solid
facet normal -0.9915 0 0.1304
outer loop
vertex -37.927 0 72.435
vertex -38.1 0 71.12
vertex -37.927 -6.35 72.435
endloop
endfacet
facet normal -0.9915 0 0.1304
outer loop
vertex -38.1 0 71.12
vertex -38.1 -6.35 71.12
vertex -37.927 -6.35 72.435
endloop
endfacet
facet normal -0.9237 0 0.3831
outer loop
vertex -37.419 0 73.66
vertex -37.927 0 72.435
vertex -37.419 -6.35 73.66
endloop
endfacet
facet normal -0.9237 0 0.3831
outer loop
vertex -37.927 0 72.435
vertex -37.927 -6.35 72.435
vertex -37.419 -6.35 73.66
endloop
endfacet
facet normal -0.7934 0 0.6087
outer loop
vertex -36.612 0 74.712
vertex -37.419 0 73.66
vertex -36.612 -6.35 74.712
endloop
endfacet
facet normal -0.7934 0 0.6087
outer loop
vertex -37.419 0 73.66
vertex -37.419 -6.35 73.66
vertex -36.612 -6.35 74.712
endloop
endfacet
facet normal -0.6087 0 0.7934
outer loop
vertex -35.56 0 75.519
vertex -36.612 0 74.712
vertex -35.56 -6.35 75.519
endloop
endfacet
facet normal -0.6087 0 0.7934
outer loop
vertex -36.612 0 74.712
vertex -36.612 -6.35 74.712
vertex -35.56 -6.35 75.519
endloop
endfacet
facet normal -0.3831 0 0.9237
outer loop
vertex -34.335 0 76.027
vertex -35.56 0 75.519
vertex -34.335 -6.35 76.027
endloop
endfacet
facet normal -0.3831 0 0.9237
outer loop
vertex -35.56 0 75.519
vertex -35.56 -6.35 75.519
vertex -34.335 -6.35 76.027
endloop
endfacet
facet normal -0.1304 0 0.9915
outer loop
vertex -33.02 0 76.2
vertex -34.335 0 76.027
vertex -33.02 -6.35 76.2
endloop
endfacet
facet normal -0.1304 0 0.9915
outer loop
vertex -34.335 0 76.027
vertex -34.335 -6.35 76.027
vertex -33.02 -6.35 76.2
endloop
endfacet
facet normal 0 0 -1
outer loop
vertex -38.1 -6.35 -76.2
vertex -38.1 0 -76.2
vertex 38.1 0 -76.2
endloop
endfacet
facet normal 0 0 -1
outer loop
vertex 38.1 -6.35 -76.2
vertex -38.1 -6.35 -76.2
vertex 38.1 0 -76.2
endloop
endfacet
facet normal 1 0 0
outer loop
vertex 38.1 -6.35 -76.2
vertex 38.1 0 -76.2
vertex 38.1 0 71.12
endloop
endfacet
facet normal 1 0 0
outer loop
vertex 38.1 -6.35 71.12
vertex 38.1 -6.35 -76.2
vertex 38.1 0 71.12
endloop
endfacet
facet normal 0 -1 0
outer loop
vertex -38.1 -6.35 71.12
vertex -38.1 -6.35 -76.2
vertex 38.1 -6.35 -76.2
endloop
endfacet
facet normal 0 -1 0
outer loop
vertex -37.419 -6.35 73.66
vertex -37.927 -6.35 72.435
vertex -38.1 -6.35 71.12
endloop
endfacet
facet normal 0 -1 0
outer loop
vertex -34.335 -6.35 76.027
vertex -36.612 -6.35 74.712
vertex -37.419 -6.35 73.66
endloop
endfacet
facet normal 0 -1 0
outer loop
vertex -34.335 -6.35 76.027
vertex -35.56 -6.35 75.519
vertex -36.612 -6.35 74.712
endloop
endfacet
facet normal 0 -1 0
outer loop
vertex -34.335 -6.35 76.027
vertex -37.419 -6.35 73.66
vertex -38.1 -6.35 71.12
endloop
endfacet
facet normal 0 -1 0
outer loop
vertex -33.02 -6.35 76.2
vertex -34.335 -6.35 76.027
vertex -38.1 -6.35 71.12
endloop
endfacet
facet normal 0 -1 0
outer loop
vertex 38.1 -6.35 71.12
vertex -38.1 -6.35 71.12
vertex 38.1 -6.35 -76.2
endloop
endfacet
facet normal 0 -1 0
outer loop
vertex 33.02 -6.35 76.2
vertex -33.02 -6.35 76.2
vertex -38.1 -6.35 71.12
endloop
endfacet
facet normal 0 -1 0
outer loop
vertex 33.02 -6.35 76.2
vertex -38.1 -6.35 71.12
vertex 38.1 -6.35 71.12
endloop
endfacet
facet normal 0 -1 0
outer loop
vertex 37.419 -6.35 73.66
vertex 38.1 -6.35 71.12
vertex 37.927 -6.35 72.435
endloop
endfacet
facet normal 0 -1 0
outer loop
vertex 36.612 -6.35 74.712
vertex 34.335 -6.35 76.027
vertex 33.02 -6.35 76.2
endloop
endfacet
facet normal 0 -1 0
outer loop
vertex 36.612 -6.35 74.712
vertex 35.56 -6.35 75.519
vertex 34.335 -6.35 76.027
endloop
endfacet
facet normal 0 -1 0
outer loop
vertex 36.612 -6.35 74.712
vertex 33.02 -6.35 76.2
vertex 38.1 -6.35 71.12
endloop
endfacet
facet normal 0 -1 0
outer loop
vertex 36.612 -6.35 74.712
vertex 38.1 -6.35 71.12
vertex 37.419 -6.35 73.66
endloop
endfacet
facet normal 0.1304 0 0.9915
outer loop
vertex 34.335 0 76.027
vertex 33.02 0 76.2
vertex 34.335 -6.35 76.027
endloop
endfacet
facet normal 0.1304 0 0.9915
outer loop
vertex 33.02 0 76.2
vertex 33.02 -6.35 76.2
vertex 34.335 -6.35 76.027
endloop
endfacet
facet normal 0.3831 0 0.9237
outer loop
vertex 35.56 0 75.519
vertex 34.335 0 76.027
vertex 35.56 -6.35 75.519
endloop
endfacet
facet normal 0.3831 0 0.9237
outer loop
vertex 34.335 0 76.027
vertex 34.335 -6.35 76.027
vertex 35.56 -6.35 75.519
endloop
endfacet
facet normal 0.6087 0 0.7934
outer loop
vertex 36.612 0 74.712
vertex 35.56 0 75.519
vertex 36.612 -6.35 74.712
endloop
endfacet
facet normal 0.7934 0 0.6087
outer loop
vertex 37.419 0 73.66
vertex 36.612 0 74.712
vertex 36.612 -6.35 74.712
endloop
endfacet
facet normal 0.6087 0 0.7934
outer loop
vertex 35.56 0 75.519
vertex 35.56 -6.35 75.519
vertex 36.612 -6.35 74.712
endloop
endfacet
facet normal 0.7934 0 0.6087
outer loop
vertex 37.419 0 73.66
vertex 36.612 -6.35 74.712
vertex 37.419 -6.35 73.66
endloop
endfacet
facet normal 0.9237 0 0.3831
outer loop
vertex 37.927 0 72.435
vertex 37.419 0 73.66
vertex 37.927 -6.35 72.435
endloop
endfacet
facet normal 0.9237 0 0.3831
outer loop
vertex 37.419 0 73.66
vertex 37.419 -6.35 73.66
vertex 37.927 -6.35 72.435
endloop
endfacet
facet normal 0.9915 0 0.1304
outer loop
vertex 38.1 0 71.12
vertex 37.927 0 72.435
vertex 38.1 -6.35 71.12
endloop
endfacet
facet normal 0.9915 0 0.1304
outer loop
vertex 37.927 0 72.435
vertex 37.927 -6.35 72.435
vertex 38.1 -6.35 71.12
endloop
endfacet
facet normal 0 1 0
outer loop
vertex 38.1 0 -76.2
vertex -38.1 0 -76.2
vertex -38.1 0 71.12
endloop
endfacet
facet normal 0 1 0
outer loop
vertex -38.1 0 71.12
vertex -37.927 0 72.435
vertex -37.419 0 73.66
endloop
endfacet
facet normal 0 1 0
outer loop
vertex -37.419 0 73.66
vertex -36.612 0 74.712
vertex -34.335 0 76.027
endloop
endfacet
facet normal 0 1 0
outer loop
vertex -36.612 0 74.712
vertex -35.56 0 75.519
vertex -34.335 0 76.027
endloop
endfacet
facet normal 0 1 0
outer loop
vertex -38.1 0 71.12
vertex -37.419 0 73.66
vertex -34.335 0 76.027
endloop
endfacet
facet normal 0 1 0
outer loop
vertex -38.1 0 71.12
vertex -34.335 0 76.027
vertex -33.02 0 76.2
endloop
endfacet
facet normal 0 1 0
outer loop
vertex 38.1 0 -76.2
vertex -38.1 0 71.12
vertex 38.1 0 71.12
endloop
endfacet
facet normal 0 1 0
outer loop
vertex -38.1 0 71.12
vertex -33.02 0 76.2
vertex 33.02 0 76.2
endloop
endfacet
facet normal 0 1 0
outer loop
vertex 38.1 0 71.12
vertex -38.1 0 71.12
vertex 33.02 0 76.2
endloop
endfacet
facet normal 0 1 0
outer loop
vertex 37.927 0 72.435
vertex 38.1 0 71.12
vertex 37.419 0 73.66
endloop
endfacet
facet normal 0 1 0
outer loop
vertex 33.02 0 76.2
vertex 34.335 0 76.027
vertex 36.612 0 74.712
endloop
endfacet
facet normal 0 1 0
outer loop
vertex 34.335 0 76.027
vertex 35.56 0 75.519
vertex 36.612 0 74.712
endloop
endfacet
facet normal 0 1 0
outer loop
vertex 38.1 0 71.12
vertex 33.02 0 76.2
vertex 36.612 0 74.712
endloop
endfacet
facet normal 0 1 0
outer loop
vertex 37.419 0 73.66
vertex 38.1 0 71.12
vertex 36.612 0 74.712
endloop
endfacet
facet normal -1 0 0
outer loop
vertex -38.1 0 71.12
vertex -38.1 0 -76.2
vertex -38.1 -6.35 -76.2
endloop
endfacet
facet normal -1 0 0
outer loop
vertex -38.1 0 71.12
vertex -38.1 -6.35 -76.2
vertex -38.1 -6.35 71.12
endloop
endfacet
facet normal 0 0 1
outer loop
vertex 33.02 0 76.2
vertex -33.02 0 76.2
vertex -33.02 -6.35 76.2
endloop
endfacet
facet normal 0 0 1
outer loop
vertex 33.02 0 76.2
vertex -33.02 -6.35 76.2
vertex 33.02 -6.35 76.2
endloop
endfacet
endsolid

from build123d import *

# Parameters (mm, degrees)
F0_W     = 76.2
F0_H     = 152.4
F1_DEPTH = 6.35
F2_R     = 5.08
F3_R     = 5.08


with BuildPart() as f1:
    # F0 (on Front) → F1 (new body)
    with BuildSketch(Plane.XZ):
        Rectangle(F0_W, F0_H)
    extrude(amount=F1_DEPTH)

    # F2
    f2_edges = [f1.edges().sort_by_distance(p)[0] for p in [
        (-38.1, -3.175, 76.2),
    ]]
    fillet(f2_edges, radius=F2_R)

    # F3
    f3_edges = [f1.edges().sort_by_distance(p)[0] for p in [
        (38.1, -3.175, 76.2),
    ]]
    fillet(f3_edges, radius=F3_R)


solid = f1.part
